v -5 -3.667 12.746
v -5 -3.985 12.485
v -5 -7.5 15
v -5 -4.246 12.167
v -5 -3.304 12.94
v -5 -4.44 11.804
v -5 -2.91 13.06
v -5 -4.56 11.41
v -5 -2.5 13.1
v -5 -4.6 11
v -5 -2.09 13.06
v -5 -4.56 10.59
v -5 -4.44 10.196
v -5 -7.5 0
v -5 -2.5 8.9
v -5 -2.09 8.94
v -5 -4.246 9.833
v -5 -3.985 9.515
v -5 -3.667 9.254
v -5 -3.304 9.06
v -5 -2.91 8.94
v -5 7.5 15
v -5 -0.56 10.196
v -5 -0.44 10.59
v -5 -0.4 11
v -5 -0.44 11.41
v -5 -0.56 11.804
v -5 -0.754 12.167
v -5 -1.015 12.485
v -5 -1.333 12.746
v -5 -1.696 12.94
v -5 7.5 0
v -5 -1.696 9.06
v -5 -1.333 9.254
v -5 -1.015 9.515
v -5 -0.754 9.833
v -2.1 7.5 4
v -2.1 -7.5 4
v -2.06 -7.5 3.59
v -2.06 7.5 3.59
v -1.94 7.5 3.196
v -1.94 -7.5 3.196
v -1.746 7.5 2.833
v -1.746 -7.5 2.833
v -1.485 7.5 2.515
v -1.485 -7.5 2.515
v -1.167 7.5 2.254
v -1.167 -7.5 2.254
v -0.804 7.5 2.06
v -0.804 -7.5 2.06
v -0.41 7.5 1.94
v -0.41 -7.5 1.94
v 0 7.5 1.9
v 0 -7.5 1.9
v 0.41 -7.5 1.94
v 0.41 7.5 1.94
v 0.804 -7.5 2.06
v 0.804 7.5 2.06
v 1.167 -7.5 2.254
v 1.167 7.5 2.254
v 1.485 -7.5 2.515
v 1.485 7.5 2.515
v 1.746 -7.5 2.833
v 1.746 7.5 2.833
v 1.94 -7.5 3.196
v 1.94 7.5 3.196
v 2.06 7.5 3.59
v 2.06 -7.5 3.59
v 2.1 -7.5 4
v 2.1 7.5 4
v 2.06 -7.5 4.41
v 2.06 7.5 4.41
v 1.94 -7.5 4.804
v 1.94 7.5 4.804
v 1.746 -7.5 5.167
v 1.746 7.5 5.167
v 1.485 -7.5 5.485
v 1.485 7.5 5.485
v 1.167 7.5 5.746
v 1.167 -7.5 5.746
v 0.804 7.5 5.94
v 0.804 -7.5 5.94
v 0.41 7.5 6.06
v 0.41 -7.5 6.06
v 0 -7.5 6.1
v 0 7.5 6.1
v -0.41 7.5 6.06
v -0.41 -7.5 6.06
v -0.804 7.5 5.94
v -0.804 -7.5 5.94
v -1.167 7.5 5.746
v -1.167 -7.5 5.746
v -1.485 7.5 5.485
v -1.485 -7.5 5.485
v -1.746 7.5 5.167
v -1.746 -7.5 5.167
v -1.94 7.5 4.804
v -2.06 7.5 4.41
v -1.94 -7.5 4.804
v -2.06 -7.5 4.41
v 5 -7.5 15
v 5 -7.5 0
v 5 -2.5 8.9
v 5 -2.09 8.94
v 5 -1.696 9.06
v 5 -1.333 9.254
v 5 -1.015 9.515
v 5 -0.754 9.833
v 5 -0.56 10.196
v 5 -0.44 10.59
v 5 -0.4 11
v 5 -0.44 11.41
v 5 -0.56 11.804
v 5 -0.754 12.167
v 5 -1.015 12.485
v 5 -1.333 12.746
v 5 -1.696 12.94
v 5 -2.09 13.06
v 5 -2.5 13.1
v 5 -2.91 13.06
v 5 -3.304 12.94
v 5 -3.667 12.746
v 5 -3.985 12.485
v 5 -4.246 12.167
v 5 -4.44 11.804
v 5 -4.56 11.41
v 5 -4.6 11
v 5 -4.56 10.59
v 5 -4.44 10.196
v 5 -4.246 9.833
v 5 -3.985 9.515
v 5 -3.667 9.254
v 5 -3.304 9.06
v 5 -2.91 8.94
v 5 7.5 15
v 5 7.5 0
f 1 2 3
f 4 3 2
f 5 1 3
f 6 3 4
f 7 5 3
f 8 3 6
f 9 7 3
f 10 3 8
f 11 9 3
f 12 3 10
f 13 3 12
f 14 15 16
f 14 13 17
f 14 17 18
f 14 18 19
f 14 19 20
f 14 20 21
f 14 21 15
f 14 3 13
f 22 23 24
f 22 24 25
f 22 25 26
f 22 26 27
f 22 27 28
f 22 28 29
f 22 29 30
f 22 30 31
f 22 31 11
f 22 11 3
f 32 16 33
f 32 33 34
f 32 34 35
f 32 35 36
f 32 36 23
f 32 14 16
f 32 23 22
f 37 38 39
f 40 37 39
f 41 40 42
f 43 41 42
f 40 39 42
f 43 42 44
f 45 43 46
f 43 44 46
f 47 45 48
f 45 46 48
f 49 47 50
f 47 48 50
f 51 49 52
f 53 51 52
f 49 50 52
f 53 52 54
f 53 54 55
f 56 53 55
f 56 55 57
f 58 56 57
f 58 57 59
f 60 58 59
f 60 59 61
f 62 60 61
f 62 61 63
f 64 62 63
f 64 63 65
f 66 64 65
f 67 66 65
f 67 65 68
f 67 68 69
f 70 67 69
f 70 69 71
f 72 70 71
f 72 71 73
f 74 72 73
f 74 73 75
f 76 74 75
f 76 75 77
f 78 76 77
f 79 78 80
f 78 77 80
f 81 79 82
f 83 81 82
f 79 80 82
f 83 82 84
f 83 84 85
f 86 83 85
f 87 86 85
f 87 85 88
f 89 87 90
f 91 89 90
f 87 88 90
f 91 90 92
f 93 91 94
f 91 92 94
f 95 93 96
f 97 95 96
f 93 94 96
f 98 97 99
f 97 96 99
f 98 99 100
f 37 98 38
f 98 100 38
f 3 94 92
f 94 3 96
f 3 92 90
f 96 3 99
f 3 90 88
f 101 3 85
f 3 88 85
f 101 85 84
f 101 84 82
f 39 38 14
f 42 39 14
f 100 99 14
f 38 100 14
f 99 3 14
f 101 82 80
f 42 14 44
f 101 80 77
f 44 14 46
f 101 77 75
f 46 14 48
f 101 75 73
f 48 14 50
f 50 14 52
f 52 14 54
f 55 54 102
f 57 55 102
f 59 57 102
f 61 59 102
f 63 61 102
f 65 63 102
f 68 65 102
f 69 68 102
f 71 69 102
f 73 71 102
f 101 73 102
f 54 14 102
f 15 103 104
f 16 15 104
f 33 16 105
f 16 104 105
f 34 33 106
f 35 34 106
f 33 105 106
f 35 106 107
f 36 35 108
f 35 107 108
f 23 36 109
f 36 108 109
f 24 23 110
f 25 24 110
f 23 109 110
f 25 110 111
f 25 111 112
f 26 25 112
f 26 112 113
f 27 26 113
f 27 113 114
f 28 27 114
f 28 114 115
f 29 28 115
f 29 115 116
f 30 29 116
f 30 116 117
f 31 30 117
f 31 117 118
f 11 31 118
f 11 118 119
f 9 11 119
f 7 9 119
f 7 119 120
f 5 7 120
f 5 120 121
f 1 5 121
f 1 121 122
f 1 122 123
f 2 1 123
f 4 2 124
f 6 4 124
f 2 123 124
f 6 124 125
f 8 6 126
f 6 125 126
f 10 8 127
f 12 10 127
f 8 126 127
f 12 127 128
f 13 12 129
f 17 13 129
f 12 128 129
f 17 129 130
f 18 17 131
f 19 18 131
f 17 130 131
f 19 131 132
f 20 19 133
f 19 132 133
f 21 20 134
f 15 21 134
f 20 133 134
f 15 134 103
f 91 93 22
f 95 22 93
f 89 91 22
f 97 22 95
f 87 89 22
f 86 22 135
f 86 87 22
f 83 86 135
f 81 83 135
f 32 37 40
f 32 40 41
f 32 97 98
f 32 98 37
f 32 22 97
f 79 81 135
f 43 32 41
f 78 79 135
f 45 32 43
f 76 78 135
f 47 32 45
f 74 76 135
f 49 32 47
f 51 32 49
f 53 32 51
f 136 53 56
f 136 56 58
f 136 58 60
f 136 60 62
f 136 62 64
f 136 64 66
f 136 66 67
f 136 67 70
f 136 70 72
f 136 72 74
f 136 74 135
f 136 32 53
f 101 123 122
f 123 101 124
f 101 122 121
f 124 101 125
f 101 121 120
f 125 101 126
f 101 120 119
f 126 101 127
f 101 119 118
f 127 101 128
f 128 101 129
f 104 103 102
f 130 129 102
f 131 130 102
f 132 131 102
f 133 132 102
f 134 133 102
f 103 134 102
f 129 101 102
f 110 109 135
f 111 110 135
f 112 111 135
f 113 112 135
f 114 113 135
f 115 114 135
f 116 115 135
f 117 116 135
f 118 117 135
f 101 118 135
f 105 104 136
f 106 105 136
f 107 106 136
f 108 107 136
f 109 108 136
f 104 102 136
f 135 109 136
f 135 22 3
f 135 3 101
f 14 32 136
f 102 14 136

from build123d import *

# Parameters (mm, degrees)
SKETCH1_W             = 10
SKETCH1_H             = 15
BOSS_EXTRUDE1_DEPTH   = 15
M5X0_8_TAPPED_HOLE1_D = 4.2
M5X0_8_TAPPED_HOLE2_D = 4.2


with BuildPart() as part:
    # Sketch1 → Boss-Extrude1 (new body)
    with BuildSketch(Plane.XY):
        Rectangle(SKETCH1_W, SKETCH1_H)
    extrude(amount=BOSS_EXTRUDE1_DEPTH)

    # M5x0.8 Tapped Hole1 (through all)
    with Locations(Plane(origin=(0, 7.5, 0), x_dir=(1, 0, 0), z_dir=(0, 1, 0))):
        with Locations((0, -4)):
            Hole(M5X0_8_TAPPED_HOLE1_D / 2)

    # M5x0.8 Tapped Hole2 (through all)
    with Locations(Plane.ZY.offset(5)):
        with Locations((11, -2.5)):
            Hole(M5X0_8_TAPPED_HOLE2_D / 2)


solid = part.part
